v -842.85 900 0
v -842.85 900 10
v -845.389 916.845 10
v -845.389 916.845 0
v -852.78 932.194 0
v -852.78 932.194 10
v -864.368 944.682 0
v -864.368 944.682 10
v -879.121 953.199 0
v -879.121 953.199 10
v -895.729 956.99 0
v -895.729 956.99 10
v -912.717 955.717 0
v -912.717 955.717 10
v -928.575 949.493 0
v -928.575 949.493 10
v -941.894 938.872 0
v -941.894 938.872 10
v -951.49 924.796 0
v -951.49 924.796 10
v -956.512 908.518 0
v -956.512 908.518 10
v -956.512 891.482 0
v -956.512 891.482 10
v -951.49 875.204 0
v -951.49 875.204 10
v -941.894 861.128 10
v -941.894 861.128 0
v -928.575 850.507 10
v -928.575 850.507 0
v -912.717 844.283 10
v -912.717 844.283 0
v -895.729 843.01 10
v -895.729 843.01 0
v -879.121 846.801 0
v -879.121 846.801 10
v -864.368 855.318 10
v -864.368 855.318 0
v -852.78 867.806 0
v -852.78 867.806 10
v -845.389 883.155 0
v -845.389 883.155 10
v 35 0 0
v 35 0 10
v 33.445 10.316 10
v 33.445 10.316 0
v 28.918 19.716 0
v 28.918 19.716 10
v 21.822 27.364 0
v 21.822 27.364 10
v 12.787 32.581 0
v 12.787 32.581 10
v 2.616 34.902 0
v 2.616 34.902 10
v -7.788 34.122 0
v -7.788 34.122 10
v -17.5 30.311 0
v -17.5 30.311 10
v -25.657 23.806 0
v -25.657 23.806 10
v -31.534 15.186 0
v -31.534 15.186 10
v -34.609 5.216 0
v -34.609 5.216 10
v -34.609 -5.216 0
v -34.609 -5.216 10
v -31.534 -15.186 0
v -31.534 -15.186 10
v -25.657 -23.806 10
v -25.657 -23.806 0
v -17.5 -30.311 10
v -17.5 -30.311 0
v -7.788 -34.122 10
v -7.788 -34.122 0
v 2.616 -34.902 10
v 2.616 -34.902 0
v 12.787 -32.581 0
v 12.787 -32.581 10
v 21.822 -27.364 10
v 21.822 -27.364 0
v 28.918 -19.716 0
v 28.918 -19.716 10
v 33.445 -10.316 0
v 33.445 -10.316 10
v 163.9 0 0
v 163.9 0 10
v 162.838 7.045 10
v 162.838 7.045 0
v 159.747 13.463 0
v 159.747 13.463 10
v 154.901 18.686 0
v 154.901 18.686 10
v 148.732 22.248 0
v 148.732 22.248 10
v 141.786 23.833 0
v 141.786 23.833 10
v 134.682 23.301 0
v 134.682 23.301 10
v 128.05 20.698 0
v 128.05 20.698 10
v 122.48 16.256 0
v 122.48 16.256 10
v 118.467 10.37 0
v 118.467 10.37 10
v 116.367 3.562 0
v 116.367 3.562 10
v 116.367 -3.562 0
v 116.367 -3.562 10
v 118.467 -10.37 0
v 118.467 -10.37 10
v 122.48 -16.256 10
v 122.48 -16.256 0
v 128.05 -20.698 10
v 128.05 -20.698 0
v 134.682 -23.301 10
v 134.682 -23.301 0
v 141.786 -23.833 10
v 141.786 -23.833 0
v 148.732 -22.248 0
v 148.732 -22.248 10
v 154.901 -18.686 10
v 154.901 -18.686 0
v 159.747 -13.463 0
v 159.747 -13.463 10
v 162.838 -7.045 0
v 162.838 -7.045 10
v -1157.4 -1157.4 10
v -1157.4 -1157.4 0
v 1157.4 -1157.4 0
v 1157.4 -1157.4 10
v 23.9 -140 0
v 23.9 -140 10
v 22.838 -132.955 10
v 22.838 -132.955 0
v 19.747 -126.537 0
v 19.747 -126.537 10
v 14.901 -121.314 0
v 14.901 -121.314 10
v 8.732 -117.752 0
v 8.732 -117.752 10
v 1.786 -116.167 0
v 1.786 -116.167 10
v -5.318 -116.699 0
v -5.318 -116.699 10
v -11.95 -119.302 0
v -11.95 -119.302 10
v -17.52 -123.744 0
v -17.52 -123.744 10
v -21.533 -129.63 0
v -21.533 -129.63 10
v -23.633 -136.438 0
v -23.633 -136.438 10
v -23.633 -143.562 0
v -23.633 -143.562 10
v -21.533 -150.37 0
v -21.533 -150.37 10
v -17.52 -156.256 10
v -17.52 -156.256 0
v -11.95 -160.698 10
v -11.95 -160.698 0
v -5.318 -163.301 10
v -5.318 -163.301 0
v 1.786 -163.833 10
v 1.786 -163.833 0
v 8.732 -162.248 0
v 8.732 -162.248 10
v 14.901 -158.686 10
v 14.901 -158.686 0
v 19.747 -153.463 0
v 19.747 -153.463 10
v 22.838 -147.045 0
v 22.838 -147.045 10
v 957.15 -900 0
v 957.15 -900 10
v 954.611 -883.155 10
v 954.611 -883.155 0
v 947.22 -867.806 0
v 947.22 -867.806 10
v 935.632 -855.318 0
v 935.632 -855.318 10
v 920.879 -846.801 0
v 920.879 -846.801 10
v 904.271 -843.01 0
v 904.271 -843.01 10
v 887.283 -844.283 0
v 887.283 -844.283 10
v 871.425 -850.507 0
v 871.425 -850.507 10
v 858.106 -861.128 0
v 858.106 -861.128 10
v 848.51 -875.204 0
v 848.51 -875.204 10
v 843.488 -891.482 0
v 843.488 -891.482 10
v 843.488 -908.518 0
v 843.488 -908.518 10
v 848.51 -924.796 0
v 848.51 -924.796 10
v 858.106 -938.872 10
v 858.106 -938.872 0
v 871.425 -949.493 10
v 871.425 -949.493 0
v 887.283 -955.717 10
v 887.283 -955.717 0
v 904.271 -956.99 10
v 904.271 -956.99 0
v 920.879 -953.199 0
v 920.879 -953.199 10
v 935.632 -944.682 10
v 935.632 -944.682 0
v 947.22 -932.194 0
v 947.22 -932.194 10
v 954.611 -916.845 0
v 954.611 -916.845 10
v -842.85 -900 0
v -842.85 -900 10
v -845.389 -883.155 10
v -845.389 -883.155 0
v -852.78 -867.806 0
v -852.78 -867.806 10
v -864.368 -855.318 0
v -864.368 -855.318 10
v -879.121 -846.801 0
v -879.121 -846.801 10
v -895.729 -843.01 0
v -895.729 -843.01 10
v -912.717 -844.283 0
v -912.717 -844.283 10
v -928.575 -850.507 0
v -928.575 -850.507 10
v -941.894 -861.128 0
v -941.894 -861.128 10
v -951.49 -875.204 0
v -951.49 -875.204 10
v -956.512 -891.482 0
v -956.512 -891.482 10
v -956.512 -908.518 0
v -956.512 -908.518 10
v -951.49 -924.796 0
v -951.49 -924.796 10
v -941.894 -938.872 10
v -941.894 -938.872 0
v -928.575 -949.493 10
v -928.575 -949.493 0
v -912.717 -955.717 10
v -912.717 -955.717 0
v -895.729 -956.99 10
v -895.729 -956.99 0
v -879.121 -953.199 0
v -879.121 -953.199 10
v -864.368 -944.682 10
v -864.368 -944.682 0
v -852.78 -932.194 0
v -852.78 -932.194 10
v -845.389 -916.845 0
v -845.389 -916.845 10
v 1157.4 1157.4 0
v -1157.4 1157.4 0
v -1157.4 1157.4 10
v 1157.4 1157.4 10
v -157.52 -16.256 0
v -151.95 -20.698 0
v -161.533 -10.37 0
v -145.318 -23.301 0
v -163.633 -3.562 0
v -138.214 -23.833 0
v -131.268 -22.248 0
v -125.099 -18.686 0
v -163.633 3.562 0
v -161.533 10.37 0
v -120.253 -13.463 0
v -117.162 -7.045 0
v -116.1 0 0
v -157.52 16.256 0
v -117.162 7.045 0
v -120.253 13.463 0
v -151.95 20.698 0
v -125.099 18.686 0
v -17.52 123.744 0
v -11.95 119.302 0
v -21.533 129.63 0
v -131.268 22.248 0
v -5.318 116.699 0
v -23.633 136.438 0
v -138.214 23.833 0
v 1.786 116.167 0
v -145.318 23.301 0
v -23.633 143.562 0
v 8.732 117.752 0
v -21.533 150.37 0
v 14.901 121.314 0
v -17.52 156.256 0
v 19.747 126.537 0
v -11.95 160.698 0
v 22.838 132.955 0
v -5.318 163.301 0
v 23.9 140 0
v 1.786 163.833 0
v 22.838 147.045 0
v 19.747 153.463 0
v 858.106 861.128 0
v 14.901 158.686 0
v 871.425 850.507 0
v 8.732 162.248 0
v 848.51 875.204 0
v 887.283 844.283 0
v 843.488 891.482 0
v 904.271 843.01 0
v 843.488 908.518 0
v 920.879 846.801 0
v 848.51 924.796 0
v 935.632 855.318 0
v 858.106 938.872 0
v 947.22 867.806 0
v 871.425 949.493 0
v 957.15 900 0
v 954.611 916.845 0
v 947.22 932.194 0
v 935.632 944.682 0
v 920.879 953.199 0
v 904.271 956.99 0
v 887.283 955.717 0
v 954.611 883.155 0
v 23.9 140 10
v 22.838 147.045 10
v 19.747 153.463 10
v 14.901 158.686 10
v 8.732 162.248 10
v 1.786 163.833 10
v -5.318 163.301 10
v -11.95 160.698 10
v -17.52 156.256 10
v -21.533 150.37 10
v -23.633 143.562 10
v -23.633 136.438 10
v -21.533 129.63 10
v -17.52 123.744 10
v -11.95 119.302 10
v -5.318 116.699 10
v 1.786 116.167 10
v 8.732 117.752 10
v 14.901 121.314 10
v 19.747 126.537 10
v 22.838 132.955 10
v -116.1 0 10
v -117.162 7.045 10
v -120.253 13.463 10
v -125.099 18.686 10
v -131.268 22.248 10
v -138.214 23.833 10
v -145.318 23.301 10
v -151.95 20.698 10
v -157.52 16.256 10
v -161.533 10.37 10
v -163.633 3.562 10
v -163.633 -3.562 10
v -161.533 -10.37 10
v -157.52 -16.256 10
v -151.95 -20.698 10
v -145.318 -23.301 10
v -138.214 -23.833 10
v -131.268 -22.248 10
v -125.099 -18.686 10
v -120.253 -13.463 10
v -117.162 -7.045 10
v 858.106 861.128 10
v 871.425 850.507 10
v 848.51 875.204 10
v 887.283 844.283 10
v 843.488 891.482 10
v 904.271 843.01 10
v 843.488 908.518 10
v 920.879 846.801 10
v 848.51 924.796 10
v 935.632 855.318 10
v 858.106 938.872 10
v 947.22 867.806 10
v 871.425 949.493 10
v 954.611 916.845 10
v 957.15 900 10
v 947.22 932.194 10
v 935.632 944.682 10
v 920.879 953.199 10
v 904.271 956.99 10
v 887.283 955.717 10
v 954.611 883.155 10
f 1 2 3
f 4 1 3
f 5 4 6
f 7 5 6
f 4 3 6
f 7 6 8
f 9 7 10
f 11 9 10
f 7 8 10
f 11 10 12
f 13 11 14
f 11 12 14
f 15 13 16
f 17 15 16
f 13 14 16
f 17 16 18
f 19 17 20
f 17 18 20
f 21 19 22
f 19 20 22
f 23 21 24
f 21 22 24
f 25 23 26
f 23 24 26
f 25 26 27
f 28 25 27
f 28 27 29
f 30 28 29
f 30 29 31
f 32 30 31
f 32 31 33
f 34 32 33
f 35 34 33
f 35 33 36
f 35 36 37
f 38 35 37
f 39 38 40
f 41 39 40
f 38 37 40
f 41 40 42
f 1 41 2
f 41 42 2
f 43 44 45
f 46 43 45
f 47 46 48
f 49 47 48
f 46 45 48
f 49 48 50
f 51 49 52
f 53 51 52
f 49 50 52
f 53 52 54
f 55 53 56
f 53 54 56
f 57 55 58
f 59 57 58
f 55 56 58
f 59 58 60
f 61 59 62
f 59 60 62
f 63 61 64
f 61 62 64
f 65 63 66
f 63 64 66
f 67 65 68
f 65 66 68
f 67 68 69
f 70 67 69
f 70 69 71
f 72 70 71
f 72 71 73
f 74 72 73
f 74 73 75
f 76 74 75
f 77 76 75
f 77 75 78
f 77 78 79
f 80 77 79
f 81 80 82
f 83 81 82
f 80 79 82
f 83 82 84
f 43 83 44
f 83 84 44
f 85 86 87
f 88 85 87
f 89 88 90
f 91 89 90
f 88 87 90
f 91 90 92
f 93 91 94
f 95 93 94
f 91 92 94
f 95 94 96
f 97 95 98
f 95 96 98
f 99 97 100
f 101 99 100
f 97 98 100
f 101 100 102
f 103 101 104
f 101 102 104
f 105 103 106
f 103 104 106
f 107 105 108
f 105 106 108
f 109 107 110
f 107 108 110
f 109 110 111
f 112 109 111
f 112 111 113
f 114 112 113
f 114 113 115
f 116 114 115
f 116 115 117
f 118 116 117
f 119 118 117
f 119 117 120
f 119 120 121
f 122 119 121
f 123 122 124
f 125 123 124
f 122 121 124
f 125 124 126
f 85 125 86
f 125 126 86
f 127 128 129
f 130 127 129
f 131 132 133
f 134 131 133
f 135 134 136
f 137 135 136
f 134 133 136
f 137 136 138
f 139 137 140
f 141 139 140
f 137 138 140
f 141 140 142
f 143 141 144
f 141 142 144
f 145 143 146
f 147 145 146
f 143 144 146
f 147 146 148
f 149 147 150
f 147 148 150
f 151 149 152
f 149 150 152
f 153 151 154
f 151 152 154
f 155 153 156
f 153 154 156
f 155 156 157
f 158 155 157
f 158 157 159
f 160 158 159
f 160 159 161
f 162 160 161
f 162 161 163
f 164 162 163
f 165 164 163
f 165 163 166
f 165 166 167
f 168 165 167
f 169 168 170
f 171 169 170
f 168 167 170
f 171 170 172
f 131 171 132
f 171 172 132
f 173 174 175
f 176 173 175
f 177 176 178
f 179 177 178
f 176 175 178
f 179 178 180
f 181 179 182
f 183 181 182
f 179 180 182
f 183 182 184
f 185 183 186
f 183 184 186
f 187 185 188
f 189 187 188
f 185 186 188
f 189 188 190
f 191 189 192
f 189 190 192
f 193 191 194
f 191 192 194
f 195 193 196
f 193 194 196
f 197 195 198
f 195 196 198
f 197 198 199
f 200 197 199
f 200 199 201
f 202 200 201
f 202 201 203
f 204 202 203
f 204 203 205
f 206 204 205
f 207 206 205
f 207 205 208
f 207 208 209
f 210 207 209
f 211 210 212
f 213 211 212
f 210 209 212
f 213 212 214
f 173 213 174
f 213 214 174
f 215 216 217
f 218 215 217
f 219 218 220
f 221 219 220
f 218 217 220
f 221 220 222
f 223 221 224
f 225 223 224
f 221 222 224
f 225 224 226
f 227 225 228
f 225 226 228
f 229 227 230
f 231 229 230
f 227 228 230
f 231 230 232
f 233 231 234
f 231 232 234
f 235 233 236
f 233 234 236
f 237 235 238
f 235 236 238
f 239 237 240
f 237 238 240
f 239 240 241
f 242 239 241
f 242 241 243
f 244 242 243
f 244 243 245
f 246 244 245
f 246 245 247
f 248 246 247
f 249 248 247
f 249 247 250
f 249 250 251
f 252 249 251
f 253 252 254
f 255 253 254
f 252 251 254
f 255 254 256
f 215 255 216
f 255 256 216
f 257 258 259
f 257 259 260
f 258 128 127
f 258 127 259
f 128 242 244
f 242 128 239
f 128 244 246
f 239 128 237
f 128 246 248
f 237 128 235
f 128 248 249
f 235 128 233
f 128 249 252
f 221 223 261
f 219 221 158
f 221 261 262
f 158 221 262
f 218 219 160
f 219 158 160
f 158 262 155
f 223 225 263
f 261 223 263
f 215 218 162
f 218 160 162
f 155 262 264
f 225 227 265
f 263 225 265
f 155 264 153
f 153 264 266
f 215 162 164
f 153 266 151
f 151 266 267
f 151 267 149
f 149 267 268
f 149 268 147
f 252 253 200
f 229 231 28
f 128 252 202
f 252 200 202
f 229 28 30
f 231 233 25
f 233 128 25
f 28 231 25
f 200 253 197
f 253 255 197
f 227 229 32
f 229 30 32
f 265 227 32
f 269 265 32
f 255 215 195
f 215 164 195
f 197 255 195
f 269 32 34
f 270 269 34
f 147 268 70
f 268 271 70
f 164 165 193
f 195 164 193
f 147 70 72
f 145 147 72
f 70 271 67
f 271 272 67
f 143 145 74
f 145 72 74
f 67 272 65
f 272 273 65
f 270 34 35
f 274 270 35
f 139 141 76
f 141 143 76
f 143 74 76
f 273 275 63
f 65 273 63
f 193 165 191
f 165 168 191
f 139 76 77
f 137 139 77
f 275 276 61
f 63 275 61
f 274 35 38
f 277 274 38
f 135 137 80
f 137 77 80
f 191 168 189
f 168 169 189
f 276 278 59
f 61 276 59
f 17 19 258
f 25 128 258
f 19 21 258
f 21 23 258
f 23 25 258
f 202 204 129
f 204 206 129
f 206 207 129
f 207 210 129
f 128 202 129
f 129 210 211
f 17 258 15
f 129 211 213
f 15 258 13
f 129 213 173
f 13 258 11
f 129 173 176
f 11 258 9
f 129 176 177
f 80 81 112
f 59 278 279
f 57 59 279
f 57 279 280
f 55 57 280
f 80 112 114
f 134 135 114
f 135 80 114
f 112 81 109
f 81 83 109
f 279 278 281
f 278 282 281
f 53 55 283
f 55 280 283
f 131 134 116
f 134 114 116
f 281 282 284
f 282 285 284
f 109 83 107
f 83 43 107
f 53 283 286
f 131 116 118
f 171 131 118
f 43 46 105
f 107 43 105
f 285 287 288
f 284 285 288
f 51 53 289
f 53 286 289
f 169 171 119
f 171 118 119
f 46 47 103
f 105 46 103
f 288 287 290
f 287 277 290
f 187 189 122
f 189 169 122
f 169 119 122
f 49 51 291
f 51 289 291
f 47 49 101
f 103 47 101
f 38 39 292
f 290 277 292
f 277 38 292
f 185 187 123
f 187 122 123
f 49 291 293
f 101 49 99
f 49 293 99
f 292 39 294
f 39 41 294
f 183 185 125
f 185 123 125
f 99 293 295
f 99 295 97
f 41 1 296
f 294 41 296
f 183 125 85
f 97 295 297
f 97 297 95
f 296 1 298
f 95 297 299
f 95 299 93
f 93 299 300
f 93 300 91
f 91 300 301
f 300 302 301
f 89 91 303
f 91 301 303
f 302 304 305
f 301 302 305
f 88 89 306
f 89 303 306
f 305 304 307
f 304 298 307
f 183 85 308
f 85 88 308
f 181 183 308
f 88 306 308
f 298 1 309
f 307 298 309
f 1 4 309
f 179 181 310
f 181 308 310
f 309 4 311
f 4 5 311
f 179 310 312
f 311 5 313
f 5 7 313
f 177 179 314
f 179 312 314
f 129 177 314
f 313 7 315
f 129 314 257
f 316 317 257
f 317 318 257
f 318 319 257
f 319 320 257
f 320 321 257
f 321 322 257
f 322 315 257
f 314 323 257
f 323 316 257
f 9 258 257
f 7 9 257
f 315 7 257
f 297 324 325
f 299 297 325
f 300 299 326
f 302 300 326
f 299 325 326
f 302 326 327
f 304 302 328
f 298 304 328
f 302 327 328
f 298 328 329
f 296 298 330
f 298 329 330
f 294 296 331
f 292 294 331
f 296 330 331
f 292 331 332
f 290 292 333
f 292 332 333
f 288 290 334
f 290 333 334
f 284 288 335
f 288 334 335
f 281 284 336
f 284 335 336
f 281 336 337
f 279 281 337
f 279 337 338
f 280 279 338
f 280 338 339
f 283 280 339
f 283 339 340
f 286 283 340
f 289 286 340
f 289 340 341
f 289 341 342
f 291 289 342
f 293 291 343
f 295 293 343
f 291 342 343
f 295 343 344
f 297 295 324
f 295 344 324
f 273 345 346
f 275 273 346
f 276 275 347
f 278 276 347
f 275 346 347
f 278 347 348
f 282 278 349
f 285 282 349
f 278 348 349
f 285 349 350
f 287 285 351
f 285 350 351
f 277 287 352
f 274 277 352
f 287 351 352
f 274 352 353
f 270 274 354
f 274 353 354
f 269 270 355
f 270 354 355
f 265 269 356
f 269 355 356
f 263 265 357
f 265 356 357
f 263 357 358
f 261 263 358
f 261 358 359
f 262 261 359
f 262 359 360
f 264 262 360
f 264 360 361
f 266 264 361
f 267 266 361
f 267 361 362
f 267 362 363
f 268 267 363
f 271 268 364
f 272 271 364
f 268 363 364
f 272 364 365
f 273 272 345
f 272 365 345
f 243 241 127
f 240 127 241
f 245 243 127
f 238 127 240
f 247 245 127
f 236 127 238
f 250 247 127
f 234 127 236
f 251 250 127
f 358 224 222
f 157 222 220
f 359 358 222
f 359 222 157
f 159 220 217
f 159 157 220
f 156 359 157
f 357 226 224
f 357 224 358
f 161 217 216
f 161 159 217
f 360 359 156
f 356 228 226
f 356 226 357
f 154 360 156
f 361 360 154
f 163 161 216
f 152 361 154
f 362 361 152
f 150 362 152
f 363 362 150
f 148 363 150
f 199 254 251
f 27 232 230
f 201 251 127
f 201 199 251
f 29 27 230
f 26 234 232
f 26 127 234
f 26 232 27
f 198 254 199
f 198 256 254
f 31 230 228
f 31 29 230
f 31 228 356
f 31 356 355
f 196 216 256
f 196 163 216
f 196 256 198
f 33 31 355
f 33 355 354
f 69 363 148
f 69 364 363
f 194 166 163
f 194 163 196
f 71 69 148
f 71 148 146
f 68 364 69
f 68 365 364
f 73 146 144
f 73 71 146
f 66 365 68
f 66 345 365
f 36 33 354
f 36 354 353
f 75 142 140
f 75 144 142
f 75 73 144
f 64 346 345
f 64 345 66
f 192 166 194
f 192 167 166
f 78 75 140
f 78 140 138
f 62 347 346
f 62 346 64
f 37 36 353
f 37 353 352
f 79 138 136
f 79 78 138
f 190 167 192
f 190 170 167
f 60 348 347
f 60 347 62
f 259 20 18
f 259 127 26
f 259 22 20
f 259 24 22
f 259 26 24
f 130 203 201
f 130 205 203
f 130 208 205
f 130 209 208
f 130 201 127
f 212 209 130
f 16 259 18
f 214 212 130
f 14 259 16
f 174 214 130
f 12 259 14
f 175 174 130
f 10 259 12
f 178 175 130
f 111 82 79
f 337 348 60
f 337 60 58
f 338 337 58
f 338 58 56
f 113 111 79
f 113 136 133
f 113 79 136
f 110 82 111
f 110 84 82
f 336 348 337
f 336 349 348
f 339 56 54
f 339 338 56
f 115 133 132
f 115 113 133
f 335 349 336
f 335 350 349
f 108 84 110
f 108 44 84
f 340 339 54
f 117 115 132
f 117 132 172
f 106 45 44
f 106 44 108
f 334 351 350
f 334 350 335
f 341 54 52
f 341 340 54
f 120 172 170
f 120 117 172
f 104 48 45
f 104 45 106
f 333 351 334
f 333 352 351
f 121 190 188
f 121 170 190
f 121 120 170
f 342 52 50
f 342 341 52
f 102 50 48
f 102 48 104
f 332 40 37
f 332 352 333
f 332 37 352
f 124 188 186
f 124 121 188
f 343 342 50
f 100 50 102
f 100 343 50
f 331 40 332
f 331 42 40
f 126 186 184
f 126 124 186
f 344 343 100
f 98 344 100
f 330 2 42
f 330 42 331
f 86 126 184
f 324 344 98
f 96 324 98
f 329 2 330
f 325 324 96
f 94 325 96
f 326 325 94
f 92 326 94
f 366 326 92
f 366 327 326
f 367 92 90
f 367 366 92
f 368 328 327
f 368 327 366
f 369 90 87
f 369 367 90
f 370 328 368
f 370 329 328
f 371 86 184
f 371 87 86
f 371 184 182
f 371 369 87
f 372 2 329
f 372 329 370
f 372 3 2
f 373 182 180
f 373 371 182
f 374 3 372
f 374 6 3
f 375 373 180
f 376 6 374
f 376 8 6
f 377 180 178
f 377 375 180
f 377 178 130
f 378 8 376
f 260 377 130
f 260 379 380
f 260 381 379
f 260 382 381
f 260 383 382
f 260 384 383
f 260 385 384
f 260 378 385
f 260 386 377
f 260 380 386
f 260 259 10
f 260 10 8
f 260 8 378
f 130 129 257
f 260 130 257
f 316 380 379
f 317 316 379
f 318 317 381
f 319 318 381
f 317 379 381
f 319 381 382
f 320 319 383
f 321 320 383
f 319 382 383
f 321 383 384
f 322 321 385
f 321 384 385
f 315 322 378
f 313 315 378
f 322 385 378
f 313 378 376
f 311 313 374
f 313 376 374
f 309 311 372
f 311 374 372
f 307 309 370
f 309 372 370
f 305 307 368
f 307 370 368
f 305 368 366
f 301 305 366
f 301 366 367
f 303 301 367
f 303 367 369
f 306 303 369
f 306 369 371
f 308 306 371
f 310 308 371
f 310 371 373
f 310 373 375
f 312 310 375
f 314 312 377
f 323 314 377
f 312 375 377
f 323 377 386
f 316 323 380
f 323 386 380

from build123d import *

# Parameters (mm, degrees)
SKETCH1_W           = 2314.8
SKETCH1_H           = 2314.8
BOSS_EXTRUDE1_DEPTH = 10
SKETCH2_R           = 35
SKETCH2_R_2         = 23.9
SKETCH2_R_3         = 57.15
CUT_EXTRUDE1_DEPTH  = 10


with BuildPart() as part:
    # Sketch1 → Boss-Extrude1 (new body)
    with BuildSketch(Plane.XY):
        Rectangle(SKETCH1_W, SKETCH1_H)
    extrude(amount=BOSS_EXTRUDE1_DEPTH)

    # Sketch2 → Cut-Extrude1 (cut)
    with BuildSketch(Plane.XY.offset(10)):
        Circle(SKETCH2_R)
        with Locations((0, 140)):
            Circle(SKETCH2_R_2)
        with Locations((0, -140)):
            Circle(SKETCH2_R_2)
        with Locations((140, 0)):
            Circle(SKETCH2_R_2)
        with Locations((-140, 0)):
            Circle(SKETCH2_R_2)
        with Locations((-900, 900)):
            Circle(SKETCH2_R_3)
        with Locations((900, 900)):
            Circle(SKETCH2_R_3)
        with Locations((900, -900)):
            Circle(SKETCH2_R_3)
        with Locations((-900, -900)):
            Circle(SKETCH2_R_3)
    extrude(amount=-CUT_EXTRUDE1_DEPTH, mode=Mode.SUBTRACT)


solid = part.part
